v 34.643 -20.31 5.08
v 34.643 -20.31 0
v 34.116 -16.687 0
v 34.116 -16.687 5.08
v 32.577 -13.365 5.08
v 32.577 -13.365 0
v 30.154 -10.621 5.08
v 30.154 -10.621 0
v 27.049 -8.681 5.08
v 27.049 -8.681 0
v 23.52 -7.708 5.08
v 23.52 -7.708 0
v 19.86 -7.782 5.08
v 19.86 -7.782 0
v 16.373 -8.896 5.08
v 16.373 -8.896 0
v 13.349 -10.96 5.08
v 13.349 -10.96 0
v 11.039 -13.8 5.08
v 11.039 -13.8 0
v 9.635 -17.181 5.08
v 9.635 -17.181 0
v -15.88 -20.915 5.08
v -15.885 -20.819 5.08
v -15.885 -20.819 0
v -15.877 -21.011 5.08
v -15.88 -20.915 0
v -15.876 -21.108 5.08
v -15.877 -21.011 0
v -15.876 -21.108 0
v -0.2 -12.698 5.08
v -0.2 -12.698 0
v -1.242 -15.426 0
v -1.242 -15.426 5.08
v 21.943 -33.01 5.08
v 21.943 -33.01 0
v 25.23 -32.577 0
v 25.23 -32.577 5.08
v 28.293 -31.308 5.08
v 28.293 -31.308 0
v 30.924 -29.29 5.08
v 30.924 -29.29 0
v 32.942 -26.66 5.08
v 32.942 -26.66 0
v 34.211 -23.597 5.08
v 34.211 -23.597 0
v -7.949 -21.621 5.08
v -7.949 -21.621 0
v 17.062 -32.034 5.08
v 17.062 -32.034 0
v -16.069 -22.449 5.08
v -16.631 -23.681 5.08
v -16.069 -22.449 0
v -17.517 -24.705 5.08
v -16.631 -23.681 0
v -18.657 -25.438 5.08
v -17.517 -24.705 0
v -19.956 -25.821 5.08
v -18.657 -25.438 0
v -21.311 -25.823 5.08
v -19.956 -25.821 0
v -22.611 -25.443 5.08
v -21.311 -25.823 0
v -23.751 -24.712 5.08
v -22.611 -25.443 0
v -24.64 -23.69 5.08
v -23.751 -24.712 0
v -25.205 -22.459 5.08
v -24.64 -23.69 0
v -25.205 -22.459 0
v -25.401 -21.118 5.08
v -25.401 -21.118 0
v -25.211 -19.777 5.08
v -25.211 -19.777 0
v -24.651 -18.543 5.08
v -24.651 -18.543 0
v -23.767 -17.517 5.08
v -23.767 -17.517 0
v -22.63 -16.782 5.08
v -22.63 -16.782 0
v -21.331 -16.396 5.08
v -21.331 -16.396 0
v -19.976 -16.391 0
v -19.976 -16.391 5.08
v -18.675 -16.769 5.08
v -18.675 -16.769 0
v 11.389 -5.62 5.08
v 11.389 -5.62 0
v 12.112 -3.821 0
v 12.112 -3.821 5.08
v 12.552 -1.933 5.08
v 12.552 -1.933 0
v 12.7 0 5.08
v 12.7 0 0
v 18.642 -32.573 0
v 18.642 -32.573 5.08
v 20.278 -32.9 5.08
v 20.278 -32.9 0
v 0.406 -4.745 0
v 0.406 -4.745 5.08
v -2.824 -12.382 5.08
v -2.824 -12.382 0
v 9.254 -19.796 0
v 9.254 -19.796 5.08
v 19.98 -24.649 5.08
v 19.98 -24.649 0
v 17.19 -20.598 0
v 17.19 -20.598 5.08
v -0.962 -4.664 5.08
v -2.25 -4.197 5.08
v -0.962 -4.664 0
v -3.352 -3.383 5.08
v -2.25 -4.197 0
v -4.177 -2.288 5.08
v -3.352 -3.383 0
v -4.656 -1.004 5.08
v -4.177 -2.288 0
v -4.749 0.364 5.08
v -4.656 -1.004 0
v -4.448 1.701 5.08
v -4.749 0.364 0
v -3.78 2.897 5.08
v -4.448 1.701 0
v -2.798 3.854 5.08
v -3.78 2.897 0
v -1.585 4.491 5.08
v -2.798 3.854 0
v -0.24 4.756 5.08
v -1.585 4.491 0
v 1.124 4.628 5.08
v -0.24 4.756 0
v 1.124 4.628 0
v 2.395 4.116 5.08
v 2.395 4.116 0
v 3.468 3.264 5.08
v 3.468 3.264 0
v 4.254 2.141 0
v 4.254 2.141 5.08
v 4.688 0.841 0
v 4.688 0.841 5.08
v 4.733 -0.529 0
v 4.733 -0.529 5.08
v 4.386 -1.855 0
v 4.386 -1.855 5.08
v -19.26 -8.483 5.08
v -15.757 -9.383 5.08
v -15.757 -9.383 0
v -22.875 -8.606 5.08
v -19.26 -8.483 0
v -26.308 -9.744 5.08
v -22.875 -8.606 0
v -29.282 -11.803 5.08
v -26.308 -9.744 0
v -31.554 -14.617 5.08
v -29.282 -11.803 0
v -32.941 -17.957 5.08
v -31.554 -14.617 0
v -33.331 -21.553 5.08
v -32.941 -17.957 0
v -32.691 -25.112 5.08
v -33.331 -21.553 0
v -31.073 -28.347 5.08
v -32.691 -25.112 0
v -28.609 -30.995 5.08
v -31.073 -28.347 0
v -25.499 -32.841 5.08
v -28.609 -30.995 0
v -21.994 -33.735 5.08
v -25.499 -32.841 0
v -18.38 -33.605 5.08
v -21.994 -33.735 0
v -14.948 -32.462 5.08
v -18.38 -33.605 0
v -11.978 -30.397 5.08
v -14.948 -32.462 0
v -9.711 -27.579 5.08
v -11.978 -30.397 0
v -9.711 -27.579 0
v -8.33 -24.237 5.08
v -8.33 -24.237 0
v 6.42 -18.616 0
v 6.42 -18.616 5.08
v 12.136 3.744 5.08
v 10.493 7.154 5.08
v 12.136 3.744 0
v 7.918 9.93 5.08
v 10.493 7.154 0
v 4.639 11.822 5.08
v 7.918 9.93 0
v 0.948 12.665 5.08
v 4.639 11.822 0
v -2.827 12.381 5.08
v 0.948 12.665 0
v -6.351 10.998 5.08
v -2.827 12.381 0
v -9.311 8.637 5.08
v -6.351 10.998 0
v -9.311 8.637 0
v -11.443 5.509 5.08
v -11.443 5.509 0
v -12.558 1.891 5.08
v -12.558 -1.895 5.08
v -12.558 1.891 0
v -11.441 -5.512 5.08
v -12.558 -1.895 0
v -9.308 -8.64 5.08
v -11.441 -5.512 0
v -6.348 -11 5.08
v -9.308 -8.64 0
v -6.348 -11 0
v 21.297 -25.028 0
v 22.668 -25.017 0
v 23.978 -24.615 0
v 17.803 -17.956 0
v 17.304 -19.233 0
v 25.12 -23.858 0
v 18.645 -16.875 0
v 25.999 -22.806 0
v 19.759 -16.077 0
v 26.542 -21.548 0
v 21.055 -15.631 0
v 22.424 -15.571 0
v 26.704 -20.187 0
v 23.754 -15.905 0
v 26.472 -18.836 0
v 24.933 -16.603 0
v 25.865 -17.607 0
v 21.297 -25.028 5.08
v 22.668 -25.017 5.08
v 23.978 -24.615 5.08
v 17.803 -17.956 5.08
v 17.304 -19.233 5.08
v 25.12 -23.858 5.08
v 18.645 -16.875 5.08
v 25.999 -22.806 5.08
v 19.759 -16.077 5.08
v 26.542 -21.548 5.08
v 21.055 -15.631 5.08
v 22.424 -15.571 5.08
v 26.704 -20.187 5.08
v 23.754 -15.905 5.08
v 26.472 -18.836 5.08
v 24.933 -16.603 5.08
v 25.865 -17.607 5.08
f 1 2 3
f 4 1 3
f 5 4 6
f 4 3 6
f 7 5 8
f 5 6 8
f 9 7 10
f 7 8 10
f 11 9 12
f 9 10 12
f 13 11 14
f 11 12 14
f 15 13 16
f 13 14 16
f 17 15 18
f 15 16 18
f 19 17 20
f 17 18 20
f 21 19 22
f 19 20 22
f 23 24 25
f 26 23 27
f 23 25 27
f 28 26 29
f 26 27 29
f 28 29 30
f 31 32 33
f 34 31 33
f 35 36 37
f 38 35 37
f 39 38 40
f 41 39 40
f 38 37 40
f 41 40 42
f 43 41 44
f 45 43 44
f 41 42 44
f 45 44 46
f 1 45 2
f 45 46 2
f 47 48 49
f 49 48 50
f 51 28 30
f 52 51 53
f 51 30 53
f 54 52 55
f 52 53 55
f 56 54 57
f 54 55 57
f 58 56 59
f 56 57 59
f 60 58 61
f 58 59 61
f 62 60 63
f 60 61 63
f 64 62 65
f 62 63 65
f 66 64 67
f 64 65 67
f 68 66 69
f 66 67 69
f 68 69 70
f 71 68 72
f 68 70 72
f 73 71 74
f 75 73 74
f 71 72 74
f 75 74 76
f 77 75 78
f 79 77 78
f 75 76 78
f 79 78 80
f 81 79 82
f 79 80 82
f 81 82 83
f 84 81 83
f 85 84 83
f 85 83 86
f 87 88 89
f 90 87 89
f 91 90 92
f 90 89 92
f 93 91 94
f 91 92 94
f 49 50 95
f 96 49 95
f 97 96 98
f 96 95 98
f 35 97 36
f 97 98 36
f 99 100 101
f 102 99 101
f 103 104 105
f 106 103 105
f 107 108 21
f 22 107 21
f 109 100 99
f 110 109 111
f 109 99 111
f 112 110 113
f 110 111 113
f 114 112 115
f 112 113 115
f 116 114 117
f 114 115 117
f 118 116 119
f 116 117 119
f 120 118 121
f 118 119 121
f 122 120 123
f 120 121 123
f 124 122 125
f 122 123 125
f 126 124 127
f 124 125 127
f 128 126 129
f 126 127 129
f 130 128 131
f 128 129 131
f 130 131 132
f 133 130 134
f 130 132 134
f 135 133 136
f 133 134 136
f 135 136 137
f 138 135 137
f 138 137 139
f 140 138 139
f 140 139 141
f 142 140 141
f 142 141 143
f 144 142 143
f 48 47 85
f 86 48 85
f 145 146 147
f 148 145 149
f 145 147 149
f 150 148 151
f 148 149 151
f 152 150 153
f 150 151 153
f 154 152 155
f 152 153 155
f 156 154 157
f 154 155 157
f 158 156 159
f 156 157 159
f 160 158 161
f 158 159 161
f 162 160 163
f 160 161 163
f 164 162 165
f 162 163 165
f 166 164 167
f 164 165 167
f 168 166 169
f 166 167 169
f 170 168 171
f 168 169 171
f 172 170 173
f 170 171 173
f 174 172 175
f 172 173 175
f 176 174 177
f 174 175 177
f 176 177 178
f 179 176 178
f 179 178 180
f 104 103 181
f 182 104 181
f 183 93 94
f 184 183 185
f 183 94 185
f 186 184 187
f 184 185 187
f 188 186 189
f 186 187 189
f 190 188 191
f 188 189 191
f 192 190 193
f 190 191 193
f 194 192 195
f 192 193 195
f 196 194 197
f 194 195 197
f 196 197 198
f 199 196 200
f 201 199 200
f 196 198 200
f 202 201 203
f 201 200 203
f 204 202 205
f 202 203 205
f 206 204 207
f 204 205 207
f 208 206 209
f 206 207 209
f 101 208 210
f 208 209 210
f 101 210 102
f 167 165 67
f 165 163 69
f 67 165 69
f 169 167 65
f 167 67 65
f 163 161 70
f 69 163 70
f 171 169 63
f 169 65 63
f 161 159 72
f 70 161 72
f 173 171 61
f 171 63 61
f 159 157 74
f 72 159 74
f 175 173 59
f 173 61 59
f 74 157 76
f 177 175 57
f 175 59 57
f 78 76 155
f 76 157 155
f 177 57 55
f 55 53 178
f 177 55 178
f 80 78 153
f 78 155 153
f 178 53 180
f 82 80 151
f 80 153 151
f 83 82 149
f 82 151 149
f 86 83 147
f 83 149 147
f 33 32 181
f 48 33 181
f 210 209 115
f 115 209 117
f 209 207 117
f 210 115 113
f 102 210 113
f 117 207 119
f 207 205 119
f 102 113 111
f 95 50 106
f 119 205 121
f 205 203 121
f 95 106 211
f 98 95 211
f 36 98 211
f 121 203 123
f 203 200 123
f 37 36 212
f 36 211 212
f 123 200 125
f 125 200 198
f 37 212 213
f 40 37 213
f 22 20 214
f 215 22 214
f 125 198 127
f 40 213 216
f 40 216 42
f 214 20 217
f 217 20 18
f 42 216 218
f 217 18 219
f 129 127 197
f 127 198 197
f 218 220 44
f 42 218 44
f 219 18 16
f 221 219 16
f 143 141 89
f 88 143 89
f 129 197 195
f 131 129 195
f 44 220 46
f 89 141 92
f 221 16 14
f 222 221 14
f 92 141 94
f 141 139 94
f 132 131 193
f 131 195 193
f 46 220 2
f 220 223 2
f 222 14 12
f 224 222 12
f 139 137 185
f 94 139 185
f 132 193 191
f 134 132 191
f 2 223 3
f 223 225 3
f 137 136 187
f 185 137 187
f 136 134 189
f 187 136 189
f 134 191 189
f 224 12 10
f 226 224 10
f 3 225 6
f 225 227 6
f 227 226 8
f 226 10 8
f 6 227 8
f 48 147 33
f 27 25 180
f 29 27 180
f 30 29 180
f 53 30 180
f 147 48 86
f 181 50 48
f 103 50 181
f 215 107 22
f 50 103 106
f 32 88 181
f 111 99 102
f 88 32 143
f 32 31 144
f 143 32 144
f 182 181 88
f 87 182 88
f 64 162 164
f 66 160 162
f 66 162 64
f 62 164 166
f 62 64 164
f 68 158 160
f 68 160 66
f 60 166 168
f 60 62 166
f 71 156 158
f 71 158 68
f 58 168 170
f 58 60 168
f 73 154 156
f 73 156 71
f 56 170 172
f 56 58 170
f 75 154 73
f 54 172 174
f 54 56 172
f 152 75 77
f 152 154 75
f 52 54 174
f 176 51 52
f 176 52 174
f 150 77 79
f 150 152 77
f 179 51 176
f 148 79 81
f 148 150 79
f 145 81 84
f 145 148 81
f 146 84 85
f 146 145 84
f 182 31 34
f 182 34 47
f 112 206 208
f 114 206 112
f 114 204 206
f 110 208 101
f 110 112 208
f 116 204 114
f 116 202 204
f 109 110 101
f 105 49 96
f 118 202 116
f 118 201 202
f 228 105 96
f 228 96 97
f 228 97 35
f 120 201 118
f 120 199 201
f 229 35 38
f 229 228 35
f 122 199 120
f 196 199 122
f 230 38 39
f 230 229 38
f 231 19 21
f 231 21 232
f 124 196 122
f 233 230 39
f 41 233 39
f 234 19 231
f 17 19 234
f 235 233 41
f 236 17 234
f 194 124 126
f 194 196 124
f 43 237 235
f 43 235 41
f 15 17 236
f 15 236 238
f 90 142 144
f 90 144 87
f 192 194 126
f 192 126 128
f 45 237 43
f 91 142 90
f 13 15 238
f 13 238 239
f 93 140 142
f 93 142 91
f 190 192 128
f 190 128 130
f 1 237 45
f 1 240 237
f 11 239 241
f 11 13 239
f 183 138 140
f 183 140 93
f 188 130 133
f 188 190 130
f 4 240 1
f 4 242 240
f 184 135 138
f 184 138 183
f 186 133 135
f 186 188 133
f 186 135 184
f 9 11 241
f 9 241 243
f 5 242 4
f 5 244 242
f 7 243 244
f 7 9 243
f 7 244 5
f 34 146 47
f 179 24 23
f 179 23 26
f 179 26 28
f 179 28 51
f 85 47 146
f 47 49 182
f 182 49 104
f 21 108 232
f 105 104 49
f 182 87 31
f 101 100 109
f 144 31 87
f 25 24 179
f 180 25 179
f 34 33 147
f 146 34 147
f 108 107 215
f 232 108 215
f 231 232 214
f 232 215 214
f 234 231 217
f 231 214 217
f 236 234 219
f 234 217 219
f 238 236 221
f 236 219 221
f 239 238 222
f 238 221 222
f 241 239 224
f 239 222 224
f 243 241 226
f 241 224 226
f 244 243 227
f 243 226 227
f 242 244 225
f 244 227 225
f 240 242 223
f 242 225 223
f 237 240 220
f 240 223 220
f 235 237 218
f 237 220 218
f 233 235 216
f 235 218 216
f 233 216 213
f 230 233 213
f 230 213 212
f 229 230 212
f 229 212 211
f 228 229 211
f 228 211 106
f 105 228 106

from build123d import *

# Parameters (mm, degrees)
F1_DEPTH = 5.08
F3_DEPTH = 25.4


# Not quite as in the source:
# - a feature names something its author has since deleted; it is built from what else it names


with BuildPart() as f1:
    # F0 (on Top) → F1 (new body)
    with BuildSketch(Plane.XY):
        with BuildLine():
            Line((6.7351920908, -6.7351920908), (8.9802561211, -8.9802561211))
            ThreePointArc((8.9802561211, -8.9802561211), (10.3222667059, -7.3987032683), (11.3889377966, -5.619795002))
            ThreePointArc((11.3889377966, -5.619795002), (12.3678921005, -2.8853500639), (12.7, 0))
            ThreePointArc((12.7, 0), (-8.9094308211, 9.0505271915), (-0.1995342432, -12.6984324263))
            Line((-0.1995342432, -12.6984324263), (0, -12.1764942784))
            Line((0, -12.1764942784), (0, -4.7625))
            ThreePointArc((0, -4.7625), (-3.3675960454, 3.3675960454), (4.7625, 0))
            ThreePointArc((4.7625, 0), (4.3999762736, -1.8225298466), (3.3675960454, -3.3675960454))
            Line((3.3675960454, -3.3675960454), (4.4901280605, -4.4901280605))
            Line((4.4901280605, -4.4901280605), (6.7351920908, -6.7351920908))
        make_face()
        with BuildLine():
            ThreePointArc((11.3889377966, -5.619795002), (10.3222667059, -7.3987032683), (8.9802561211, -8.9802561211))
            ThreePointArc((8.9802561211, -8.9802561211), (6.8924812287, -10.6669443849), (4.4968663349, -11.8772131902))
            Line((4.4968663349, -11.8772131902), (2.3084511304, -16.9045766677))
            Line((2.3084511304, -16.9045766677), (6.4203654177, -18.6164988404))
            Line((6.4203654177, -18.6164988404), (11.3889377966, -5.619795002))
        make_face()
        with BuildLine():
            Line((2.3084511304, -16.9045766677), (4.4968663349, -11.8772131902))
            ThreePointArc((4.4968663349, -11.8772131902), (2.2857594454, -12.4926099658), (0, -12.7))
            ThreePointArc((0, -12.7), (-0.0997702004, -12.6996081005), (-0.1995342432, -12.6984324263))
            Line((-0.1995342432, -12.6984324263), (-1.2423673122, -15.4262567422))
            Line((-1.2423673122, -15.4262567422), (2.3084511304, -16.9045766677))
        make_face()
        with BuildLine():
            Line((9.2538210972, -19.7961575745), (6.4203654177, -18.6164988404))
            Line((6.4203654177, -18.6164988404), (2.3084511304, -16.9045766677))
            Line((2.3084511304, -16.9045766677), (0.652517293, -20.7086908404))
            Line((0.652517293, -20.7086908404), (10.0662240577, -24.8064846655))
            ThreePointArc((10.0662240577, -24.8064846655), (9.4071650605, -22.3423208774), (9.2538210972, -19.7961575745))
        make_face()
        with BuildLine():
            ThreePointArc((-0.1995342432, -12.6984324263), (-0.0997702004, -12.6996081005), (0, -12.7))
            Line((0, -12.7), (0, -12.1764942784))
            Line((0, -12.1764942784), (-0.1995342432, -12.6984324263))
        make_face()
        with BuildLine():
            Line((0.652517293, -20.7086908404), (2.3084511304, -16.9045766677))
            Line((2.3084511304, -16.9045766677), (-1.2423673122, -15.4262567422))
            Line((-1.2423673122, -15.4262567422), (-15.757129186, -9.3832945241))
            ThreePointArc((-15.757129186, -9.3832945241), (-13.5731230118, -10.5544783892), (-11.6581465409, -12.1275072291))
            ThreePointArc((-11.6581465409, -12.1275072291), (-9.971458277, -14.2152821214), (-8.7611894717, -16.6108970152))
            Line((-8.7611894717, -16.6108970152), (0.652517293, -20.7086908404))
        make_face()
        with BuildLine():
            Line((18.5758412025, -23.677214376), (9.2538210972, -19.7961575745))
            ThreePointArc((9.2538210972, -19.7961575745), (9.4071650605, -22.3423208774), (10.0662240577, -24.8064846655))
            Line((10.0662240577, -24.8064846655), (15.2082451571, -27.0448104214))
            Line((15.2082451571, -27.0448104214), (17.4533091874, -24.7997463911))
            Line((17.4533091874, -24.7997463911), (18.5758412025, -23.677214376))
        make_face()
        with BuildLine():
            ThreePointArc((34.6434372479, -20.3096183306), (22.2002201194, -7.6122145583), (9.2538210972, -19.7961575745))
            Line((9.2538210972, -19.7961575745), (18.5758412025, -23.677214376))
            ThreePointArc((18.5758412025, -23.677214376), (20.1209074013, -15.909642057), (26.7059372479, -20.3096183306))
            ThreePointArc((26.7059372479, -20.3096183306), (25.3110332933, -23.677214376), (21.9434372479, -25.0721183306))
            Line((21.9434372479, -25.0721183306), (21.9434372479, -33.0096183306))
            ThreePointArc((21.9434372479, -33.0096183306), (30.923693369, -29.2898744517), (34.6434372479, -20.3096183306))
        make_face()
        with BuildLine():
            Line((10.0662240577, -24.8064846655), (0.652517293, -20.7086908404))
            Line((0.652517293, -20.7086908404), (-8.7611894717, -16.6108970152))
            ThreePointArc((-8.7611894717, -16.6108970152), (-8.1457926961, -18.8220039048), (-7.9384026619, -21.1077633501))
            ThreePointArc((-7.9384026619, -21.1077633501), (-7.9409988896, -21.3645462216), (-7.9487865112, -21.6212241063))
            Line((-7.9487865112, -21.6212241063), (17.062163772, -32.0340871567))
            ThreePointArc((17.062163772, -32.0340871567), (14.8781575978, -30.8629032915), (12.9631811269, -29.2898744517))
            ThreePointArc((12.9631811269, -29.2898744517), (11.276492863, -27.2020995593), (10.0662240577, -24.8064846655))
        make_face()
        with BuildLine():
            ThreePointArc((21.9434372479, -25.0721183306), (20.1209074013, -24.7095946042), (18.5758412025, -23.677214376))
            Line((18.5758412025, -23.677214376), (17.4533091874, -24.7997463911))
            Line((17.4533091874, -24.7997463911), (15.2082451571, -27.0448104214))
            Line((15.2082451571, -27.0448104214), (12.9631811269, -29.2898744517))
            ThreePointArc((12.9631811269, -29.2898744517), (14.8781575978, -30.8629032915), (17.062163772, -32.0340871567))
            ThreePointArc((17.062163772, -32.0340871567), (19.4545372993, -32.7633477739), (21.9434372479, -33.0096183306))
            Line((21.9434372479, -33.0096183306), (21.9434372479, -25.0721183306))
        make_face()
        with BuildLine():
            ThreePointArc((-11.6581465409, -12.1275072291), (-13.5731230118, -10.5544783892), (-15.757129186, -9.3832945241))
            ThreePointArc((-15.757129186, -9.3832945241), (-31.3447452065, -27.9388854628), (-7.9487865112, -21.6212241063))
            Line((-7.9487865112, -21.6212241063), (-9.1820824244, -21.1077633501))
            Line((-9.1820824244, -21.1077633501), (-15.8759026619, -21.1077633501))
            ThreePointArc((-15.8759026619, -21.1077633501), (-25.0383789355, -22.9302931968), (-17.2708066165, -17.7401673047))
            Line((-17.2708066165, -17.7401673047), (-16.1482746014, -16.6176352896))
            Line((-16.1482746014, -16.6176352896), (-13.9032105711, -14.3725712593))
            Line((-13.9032105711, -14.3725712593), (-11.6581465409, -12.1275072291))
        make_face()
        with BuildLine():
            Line((-9.1820824244, -21.1077633501), (-7.9487865112, -21.6212241063))
            ThreePointArc((-7.9487865112, -21.6212241063), (-7.9409988896, -21.3645462216), (-7.9384026619, -21.1077633501))
            Line((-7.9384026619, -21.1077633501), (-9.1820824244, -21.1077633501))
        make_face()
        with BuildLine():
            Line((15.2082451571, -27.0448104214), (10.0662240577, -24.8064846655))
            ThreePointArc((10.0662240577, -24.8064846655), (11.276492863, -27.2020995593), (12.9631811269, -29.2898744517))
            Line((12.9631811269, -29.2898744517), (15.2082451571, -27.0448104214))
        make_face()
        with BuildLine():
            ThreePointArc((0, -12.7), (2.2857594454, -12.4926099658), (4.4968663349, -11.8772131902))
            Line((4.4968663349, -11.8772131902), (6.7351920908, -6.7351920908))
            Line((6.7351920908, -6.7351920908), (4.4901280605, -4.4901280605))
            Line((4.4901280605, -4.4901280605), (3.3675960454, -3.3675960454))
            Line((3.3675960454, -3.3675960454), (0, -12.1764942784))
            Line((0, -12.1764942784), (0, -12.7))
        make_face()
        with BuildLine():
            Line((-15.8759026619, -21.1077633501), (-9.1820824244, -21.1077633501))
            Line((-9.1820824244, -21.1077633501), (-17.2708066165, -17.7401673047))
            ThreePointArc((-17.2708066165, -17.7401673047), (-16.2384263884, -19.2852335035), (-15.8759026619, -21.1077633501))
        make_face()
        with BuildLine():
            ThreePointArc((-7.9384026619, -21.1077633501), (-8.1457926961, -18.8220039048), (-8.7611894717, -16.6108970152))
            Line((-8.7611894717, -16.6108970152), (-13.9032105711, -14.3725712593))
            Line((-13.9032105711, -14.3725712593), (-16.1482746014, -16.6176352896))
            Line((-16.1482746014, -16.6176352896), (-17.2708066165, -17.7401673047))
            Line((-17.2708066165, -17.7401673047), (-9.1820824244, -21.1077633501))
            Line((-9.1820824244, -21.1077633501), (-7.9384026619, -21.1077633501))
        make_face()
        with BuildLine():
            Line((0, -4.7625), (0, -12.1764942784))
            Line((0, -12.1764942784), (3.3675960454, -3.3675960454))
            ThreePointArc((3.3675960454, -3.3675960454), (1.8225298466, -4.3999762736), (0, -4.7625))
        make_face()
        with BuildLine():
            Line((-13.9032105711, -14.3725712593), (-8.7611894717, -16.6108970152))
            ThreePointArc((-8.7611894717, -16.6108970152), (-9.971458277, -14.2152821214), (-11.6581465409, -12.1275072291))
            Line((-11.6581465409, -12.1275072291), (-13.9032105711, -14.3725712593))
        make_face()
        with BuildLine():
            ThreePointArc((4.4968663349, -11.8772131902), (6.8924812287, -10.6669443849), (8.9802561211, -8.9802561211))
            Line((8.9802561211, -8.9802561211), (6.7351920908, -6.7351920908))
            Line((6.7351920908, -6.7351920908), (4.4968663349, -11.8772131902))
        make_face()
    extrude(amount=F1_DEPTH)

    # F2 (on face) → F3 (cut)
    with BuildSketch(Plane.XY.offset(5.08)):
        with BuildLine():
            Line((-15.8846679825, -20.8189505253), (-8.3298662663, -24.2366500209))
            ThreePointArc((-8.3298662663, -24.2366500209), (-8.0711029973, -22.9388775299), (-7.9487865112, -21.6212241063))
            Line((-7.9487865112, -21.6212241063), (-18.6754288181, -16.7686228893))
            ThreePointArc((-18.6754288181, -16.7686228893), (-16.7166897918, -18.4056207903), (-15.8846679825, -20.8189505253))
        make_face()
        with BuildLine():
            ThreePointArc((-2.823583262, -12.3821394582), (-1.5198092555, -12.6087342674), (-0.1995342432, -12.6984324263))
            Line((-0.1995342432, -12.6984324263), (4.3863512165, -1.8550820077))
            ThreePointArc((4.3863512165, -1.8550820077), (2.7982865403, -3.8536993511), (0.406267641, -4.7451399193))
            Line((0.406267641, -4.7451399193), (-2.823583262, -12.3821394582))
        make_face()
        with BuildLine():
            ThreePointArc((9.6349008523, -17.1807316599), (9.3761375833, -18.4785041508), (9.2538210972, -19.7961575745))
            Line((9.2538210972, -19.7961575745), (19.9804634041, -24.6487587914))
            ThreePointArc((19.9804634041, -24.6487587914), (18.0217243778, -23.0117608905), (17.1897025685, -20.5984311555))
            Line((17.1897025685, -20.5984311555), (9.6349008523, -17.1807316599))
        make_face()
    extrude(amount=-F3_DEPTH, mode=Mode.SUBTRACT)


solid = f1.part
